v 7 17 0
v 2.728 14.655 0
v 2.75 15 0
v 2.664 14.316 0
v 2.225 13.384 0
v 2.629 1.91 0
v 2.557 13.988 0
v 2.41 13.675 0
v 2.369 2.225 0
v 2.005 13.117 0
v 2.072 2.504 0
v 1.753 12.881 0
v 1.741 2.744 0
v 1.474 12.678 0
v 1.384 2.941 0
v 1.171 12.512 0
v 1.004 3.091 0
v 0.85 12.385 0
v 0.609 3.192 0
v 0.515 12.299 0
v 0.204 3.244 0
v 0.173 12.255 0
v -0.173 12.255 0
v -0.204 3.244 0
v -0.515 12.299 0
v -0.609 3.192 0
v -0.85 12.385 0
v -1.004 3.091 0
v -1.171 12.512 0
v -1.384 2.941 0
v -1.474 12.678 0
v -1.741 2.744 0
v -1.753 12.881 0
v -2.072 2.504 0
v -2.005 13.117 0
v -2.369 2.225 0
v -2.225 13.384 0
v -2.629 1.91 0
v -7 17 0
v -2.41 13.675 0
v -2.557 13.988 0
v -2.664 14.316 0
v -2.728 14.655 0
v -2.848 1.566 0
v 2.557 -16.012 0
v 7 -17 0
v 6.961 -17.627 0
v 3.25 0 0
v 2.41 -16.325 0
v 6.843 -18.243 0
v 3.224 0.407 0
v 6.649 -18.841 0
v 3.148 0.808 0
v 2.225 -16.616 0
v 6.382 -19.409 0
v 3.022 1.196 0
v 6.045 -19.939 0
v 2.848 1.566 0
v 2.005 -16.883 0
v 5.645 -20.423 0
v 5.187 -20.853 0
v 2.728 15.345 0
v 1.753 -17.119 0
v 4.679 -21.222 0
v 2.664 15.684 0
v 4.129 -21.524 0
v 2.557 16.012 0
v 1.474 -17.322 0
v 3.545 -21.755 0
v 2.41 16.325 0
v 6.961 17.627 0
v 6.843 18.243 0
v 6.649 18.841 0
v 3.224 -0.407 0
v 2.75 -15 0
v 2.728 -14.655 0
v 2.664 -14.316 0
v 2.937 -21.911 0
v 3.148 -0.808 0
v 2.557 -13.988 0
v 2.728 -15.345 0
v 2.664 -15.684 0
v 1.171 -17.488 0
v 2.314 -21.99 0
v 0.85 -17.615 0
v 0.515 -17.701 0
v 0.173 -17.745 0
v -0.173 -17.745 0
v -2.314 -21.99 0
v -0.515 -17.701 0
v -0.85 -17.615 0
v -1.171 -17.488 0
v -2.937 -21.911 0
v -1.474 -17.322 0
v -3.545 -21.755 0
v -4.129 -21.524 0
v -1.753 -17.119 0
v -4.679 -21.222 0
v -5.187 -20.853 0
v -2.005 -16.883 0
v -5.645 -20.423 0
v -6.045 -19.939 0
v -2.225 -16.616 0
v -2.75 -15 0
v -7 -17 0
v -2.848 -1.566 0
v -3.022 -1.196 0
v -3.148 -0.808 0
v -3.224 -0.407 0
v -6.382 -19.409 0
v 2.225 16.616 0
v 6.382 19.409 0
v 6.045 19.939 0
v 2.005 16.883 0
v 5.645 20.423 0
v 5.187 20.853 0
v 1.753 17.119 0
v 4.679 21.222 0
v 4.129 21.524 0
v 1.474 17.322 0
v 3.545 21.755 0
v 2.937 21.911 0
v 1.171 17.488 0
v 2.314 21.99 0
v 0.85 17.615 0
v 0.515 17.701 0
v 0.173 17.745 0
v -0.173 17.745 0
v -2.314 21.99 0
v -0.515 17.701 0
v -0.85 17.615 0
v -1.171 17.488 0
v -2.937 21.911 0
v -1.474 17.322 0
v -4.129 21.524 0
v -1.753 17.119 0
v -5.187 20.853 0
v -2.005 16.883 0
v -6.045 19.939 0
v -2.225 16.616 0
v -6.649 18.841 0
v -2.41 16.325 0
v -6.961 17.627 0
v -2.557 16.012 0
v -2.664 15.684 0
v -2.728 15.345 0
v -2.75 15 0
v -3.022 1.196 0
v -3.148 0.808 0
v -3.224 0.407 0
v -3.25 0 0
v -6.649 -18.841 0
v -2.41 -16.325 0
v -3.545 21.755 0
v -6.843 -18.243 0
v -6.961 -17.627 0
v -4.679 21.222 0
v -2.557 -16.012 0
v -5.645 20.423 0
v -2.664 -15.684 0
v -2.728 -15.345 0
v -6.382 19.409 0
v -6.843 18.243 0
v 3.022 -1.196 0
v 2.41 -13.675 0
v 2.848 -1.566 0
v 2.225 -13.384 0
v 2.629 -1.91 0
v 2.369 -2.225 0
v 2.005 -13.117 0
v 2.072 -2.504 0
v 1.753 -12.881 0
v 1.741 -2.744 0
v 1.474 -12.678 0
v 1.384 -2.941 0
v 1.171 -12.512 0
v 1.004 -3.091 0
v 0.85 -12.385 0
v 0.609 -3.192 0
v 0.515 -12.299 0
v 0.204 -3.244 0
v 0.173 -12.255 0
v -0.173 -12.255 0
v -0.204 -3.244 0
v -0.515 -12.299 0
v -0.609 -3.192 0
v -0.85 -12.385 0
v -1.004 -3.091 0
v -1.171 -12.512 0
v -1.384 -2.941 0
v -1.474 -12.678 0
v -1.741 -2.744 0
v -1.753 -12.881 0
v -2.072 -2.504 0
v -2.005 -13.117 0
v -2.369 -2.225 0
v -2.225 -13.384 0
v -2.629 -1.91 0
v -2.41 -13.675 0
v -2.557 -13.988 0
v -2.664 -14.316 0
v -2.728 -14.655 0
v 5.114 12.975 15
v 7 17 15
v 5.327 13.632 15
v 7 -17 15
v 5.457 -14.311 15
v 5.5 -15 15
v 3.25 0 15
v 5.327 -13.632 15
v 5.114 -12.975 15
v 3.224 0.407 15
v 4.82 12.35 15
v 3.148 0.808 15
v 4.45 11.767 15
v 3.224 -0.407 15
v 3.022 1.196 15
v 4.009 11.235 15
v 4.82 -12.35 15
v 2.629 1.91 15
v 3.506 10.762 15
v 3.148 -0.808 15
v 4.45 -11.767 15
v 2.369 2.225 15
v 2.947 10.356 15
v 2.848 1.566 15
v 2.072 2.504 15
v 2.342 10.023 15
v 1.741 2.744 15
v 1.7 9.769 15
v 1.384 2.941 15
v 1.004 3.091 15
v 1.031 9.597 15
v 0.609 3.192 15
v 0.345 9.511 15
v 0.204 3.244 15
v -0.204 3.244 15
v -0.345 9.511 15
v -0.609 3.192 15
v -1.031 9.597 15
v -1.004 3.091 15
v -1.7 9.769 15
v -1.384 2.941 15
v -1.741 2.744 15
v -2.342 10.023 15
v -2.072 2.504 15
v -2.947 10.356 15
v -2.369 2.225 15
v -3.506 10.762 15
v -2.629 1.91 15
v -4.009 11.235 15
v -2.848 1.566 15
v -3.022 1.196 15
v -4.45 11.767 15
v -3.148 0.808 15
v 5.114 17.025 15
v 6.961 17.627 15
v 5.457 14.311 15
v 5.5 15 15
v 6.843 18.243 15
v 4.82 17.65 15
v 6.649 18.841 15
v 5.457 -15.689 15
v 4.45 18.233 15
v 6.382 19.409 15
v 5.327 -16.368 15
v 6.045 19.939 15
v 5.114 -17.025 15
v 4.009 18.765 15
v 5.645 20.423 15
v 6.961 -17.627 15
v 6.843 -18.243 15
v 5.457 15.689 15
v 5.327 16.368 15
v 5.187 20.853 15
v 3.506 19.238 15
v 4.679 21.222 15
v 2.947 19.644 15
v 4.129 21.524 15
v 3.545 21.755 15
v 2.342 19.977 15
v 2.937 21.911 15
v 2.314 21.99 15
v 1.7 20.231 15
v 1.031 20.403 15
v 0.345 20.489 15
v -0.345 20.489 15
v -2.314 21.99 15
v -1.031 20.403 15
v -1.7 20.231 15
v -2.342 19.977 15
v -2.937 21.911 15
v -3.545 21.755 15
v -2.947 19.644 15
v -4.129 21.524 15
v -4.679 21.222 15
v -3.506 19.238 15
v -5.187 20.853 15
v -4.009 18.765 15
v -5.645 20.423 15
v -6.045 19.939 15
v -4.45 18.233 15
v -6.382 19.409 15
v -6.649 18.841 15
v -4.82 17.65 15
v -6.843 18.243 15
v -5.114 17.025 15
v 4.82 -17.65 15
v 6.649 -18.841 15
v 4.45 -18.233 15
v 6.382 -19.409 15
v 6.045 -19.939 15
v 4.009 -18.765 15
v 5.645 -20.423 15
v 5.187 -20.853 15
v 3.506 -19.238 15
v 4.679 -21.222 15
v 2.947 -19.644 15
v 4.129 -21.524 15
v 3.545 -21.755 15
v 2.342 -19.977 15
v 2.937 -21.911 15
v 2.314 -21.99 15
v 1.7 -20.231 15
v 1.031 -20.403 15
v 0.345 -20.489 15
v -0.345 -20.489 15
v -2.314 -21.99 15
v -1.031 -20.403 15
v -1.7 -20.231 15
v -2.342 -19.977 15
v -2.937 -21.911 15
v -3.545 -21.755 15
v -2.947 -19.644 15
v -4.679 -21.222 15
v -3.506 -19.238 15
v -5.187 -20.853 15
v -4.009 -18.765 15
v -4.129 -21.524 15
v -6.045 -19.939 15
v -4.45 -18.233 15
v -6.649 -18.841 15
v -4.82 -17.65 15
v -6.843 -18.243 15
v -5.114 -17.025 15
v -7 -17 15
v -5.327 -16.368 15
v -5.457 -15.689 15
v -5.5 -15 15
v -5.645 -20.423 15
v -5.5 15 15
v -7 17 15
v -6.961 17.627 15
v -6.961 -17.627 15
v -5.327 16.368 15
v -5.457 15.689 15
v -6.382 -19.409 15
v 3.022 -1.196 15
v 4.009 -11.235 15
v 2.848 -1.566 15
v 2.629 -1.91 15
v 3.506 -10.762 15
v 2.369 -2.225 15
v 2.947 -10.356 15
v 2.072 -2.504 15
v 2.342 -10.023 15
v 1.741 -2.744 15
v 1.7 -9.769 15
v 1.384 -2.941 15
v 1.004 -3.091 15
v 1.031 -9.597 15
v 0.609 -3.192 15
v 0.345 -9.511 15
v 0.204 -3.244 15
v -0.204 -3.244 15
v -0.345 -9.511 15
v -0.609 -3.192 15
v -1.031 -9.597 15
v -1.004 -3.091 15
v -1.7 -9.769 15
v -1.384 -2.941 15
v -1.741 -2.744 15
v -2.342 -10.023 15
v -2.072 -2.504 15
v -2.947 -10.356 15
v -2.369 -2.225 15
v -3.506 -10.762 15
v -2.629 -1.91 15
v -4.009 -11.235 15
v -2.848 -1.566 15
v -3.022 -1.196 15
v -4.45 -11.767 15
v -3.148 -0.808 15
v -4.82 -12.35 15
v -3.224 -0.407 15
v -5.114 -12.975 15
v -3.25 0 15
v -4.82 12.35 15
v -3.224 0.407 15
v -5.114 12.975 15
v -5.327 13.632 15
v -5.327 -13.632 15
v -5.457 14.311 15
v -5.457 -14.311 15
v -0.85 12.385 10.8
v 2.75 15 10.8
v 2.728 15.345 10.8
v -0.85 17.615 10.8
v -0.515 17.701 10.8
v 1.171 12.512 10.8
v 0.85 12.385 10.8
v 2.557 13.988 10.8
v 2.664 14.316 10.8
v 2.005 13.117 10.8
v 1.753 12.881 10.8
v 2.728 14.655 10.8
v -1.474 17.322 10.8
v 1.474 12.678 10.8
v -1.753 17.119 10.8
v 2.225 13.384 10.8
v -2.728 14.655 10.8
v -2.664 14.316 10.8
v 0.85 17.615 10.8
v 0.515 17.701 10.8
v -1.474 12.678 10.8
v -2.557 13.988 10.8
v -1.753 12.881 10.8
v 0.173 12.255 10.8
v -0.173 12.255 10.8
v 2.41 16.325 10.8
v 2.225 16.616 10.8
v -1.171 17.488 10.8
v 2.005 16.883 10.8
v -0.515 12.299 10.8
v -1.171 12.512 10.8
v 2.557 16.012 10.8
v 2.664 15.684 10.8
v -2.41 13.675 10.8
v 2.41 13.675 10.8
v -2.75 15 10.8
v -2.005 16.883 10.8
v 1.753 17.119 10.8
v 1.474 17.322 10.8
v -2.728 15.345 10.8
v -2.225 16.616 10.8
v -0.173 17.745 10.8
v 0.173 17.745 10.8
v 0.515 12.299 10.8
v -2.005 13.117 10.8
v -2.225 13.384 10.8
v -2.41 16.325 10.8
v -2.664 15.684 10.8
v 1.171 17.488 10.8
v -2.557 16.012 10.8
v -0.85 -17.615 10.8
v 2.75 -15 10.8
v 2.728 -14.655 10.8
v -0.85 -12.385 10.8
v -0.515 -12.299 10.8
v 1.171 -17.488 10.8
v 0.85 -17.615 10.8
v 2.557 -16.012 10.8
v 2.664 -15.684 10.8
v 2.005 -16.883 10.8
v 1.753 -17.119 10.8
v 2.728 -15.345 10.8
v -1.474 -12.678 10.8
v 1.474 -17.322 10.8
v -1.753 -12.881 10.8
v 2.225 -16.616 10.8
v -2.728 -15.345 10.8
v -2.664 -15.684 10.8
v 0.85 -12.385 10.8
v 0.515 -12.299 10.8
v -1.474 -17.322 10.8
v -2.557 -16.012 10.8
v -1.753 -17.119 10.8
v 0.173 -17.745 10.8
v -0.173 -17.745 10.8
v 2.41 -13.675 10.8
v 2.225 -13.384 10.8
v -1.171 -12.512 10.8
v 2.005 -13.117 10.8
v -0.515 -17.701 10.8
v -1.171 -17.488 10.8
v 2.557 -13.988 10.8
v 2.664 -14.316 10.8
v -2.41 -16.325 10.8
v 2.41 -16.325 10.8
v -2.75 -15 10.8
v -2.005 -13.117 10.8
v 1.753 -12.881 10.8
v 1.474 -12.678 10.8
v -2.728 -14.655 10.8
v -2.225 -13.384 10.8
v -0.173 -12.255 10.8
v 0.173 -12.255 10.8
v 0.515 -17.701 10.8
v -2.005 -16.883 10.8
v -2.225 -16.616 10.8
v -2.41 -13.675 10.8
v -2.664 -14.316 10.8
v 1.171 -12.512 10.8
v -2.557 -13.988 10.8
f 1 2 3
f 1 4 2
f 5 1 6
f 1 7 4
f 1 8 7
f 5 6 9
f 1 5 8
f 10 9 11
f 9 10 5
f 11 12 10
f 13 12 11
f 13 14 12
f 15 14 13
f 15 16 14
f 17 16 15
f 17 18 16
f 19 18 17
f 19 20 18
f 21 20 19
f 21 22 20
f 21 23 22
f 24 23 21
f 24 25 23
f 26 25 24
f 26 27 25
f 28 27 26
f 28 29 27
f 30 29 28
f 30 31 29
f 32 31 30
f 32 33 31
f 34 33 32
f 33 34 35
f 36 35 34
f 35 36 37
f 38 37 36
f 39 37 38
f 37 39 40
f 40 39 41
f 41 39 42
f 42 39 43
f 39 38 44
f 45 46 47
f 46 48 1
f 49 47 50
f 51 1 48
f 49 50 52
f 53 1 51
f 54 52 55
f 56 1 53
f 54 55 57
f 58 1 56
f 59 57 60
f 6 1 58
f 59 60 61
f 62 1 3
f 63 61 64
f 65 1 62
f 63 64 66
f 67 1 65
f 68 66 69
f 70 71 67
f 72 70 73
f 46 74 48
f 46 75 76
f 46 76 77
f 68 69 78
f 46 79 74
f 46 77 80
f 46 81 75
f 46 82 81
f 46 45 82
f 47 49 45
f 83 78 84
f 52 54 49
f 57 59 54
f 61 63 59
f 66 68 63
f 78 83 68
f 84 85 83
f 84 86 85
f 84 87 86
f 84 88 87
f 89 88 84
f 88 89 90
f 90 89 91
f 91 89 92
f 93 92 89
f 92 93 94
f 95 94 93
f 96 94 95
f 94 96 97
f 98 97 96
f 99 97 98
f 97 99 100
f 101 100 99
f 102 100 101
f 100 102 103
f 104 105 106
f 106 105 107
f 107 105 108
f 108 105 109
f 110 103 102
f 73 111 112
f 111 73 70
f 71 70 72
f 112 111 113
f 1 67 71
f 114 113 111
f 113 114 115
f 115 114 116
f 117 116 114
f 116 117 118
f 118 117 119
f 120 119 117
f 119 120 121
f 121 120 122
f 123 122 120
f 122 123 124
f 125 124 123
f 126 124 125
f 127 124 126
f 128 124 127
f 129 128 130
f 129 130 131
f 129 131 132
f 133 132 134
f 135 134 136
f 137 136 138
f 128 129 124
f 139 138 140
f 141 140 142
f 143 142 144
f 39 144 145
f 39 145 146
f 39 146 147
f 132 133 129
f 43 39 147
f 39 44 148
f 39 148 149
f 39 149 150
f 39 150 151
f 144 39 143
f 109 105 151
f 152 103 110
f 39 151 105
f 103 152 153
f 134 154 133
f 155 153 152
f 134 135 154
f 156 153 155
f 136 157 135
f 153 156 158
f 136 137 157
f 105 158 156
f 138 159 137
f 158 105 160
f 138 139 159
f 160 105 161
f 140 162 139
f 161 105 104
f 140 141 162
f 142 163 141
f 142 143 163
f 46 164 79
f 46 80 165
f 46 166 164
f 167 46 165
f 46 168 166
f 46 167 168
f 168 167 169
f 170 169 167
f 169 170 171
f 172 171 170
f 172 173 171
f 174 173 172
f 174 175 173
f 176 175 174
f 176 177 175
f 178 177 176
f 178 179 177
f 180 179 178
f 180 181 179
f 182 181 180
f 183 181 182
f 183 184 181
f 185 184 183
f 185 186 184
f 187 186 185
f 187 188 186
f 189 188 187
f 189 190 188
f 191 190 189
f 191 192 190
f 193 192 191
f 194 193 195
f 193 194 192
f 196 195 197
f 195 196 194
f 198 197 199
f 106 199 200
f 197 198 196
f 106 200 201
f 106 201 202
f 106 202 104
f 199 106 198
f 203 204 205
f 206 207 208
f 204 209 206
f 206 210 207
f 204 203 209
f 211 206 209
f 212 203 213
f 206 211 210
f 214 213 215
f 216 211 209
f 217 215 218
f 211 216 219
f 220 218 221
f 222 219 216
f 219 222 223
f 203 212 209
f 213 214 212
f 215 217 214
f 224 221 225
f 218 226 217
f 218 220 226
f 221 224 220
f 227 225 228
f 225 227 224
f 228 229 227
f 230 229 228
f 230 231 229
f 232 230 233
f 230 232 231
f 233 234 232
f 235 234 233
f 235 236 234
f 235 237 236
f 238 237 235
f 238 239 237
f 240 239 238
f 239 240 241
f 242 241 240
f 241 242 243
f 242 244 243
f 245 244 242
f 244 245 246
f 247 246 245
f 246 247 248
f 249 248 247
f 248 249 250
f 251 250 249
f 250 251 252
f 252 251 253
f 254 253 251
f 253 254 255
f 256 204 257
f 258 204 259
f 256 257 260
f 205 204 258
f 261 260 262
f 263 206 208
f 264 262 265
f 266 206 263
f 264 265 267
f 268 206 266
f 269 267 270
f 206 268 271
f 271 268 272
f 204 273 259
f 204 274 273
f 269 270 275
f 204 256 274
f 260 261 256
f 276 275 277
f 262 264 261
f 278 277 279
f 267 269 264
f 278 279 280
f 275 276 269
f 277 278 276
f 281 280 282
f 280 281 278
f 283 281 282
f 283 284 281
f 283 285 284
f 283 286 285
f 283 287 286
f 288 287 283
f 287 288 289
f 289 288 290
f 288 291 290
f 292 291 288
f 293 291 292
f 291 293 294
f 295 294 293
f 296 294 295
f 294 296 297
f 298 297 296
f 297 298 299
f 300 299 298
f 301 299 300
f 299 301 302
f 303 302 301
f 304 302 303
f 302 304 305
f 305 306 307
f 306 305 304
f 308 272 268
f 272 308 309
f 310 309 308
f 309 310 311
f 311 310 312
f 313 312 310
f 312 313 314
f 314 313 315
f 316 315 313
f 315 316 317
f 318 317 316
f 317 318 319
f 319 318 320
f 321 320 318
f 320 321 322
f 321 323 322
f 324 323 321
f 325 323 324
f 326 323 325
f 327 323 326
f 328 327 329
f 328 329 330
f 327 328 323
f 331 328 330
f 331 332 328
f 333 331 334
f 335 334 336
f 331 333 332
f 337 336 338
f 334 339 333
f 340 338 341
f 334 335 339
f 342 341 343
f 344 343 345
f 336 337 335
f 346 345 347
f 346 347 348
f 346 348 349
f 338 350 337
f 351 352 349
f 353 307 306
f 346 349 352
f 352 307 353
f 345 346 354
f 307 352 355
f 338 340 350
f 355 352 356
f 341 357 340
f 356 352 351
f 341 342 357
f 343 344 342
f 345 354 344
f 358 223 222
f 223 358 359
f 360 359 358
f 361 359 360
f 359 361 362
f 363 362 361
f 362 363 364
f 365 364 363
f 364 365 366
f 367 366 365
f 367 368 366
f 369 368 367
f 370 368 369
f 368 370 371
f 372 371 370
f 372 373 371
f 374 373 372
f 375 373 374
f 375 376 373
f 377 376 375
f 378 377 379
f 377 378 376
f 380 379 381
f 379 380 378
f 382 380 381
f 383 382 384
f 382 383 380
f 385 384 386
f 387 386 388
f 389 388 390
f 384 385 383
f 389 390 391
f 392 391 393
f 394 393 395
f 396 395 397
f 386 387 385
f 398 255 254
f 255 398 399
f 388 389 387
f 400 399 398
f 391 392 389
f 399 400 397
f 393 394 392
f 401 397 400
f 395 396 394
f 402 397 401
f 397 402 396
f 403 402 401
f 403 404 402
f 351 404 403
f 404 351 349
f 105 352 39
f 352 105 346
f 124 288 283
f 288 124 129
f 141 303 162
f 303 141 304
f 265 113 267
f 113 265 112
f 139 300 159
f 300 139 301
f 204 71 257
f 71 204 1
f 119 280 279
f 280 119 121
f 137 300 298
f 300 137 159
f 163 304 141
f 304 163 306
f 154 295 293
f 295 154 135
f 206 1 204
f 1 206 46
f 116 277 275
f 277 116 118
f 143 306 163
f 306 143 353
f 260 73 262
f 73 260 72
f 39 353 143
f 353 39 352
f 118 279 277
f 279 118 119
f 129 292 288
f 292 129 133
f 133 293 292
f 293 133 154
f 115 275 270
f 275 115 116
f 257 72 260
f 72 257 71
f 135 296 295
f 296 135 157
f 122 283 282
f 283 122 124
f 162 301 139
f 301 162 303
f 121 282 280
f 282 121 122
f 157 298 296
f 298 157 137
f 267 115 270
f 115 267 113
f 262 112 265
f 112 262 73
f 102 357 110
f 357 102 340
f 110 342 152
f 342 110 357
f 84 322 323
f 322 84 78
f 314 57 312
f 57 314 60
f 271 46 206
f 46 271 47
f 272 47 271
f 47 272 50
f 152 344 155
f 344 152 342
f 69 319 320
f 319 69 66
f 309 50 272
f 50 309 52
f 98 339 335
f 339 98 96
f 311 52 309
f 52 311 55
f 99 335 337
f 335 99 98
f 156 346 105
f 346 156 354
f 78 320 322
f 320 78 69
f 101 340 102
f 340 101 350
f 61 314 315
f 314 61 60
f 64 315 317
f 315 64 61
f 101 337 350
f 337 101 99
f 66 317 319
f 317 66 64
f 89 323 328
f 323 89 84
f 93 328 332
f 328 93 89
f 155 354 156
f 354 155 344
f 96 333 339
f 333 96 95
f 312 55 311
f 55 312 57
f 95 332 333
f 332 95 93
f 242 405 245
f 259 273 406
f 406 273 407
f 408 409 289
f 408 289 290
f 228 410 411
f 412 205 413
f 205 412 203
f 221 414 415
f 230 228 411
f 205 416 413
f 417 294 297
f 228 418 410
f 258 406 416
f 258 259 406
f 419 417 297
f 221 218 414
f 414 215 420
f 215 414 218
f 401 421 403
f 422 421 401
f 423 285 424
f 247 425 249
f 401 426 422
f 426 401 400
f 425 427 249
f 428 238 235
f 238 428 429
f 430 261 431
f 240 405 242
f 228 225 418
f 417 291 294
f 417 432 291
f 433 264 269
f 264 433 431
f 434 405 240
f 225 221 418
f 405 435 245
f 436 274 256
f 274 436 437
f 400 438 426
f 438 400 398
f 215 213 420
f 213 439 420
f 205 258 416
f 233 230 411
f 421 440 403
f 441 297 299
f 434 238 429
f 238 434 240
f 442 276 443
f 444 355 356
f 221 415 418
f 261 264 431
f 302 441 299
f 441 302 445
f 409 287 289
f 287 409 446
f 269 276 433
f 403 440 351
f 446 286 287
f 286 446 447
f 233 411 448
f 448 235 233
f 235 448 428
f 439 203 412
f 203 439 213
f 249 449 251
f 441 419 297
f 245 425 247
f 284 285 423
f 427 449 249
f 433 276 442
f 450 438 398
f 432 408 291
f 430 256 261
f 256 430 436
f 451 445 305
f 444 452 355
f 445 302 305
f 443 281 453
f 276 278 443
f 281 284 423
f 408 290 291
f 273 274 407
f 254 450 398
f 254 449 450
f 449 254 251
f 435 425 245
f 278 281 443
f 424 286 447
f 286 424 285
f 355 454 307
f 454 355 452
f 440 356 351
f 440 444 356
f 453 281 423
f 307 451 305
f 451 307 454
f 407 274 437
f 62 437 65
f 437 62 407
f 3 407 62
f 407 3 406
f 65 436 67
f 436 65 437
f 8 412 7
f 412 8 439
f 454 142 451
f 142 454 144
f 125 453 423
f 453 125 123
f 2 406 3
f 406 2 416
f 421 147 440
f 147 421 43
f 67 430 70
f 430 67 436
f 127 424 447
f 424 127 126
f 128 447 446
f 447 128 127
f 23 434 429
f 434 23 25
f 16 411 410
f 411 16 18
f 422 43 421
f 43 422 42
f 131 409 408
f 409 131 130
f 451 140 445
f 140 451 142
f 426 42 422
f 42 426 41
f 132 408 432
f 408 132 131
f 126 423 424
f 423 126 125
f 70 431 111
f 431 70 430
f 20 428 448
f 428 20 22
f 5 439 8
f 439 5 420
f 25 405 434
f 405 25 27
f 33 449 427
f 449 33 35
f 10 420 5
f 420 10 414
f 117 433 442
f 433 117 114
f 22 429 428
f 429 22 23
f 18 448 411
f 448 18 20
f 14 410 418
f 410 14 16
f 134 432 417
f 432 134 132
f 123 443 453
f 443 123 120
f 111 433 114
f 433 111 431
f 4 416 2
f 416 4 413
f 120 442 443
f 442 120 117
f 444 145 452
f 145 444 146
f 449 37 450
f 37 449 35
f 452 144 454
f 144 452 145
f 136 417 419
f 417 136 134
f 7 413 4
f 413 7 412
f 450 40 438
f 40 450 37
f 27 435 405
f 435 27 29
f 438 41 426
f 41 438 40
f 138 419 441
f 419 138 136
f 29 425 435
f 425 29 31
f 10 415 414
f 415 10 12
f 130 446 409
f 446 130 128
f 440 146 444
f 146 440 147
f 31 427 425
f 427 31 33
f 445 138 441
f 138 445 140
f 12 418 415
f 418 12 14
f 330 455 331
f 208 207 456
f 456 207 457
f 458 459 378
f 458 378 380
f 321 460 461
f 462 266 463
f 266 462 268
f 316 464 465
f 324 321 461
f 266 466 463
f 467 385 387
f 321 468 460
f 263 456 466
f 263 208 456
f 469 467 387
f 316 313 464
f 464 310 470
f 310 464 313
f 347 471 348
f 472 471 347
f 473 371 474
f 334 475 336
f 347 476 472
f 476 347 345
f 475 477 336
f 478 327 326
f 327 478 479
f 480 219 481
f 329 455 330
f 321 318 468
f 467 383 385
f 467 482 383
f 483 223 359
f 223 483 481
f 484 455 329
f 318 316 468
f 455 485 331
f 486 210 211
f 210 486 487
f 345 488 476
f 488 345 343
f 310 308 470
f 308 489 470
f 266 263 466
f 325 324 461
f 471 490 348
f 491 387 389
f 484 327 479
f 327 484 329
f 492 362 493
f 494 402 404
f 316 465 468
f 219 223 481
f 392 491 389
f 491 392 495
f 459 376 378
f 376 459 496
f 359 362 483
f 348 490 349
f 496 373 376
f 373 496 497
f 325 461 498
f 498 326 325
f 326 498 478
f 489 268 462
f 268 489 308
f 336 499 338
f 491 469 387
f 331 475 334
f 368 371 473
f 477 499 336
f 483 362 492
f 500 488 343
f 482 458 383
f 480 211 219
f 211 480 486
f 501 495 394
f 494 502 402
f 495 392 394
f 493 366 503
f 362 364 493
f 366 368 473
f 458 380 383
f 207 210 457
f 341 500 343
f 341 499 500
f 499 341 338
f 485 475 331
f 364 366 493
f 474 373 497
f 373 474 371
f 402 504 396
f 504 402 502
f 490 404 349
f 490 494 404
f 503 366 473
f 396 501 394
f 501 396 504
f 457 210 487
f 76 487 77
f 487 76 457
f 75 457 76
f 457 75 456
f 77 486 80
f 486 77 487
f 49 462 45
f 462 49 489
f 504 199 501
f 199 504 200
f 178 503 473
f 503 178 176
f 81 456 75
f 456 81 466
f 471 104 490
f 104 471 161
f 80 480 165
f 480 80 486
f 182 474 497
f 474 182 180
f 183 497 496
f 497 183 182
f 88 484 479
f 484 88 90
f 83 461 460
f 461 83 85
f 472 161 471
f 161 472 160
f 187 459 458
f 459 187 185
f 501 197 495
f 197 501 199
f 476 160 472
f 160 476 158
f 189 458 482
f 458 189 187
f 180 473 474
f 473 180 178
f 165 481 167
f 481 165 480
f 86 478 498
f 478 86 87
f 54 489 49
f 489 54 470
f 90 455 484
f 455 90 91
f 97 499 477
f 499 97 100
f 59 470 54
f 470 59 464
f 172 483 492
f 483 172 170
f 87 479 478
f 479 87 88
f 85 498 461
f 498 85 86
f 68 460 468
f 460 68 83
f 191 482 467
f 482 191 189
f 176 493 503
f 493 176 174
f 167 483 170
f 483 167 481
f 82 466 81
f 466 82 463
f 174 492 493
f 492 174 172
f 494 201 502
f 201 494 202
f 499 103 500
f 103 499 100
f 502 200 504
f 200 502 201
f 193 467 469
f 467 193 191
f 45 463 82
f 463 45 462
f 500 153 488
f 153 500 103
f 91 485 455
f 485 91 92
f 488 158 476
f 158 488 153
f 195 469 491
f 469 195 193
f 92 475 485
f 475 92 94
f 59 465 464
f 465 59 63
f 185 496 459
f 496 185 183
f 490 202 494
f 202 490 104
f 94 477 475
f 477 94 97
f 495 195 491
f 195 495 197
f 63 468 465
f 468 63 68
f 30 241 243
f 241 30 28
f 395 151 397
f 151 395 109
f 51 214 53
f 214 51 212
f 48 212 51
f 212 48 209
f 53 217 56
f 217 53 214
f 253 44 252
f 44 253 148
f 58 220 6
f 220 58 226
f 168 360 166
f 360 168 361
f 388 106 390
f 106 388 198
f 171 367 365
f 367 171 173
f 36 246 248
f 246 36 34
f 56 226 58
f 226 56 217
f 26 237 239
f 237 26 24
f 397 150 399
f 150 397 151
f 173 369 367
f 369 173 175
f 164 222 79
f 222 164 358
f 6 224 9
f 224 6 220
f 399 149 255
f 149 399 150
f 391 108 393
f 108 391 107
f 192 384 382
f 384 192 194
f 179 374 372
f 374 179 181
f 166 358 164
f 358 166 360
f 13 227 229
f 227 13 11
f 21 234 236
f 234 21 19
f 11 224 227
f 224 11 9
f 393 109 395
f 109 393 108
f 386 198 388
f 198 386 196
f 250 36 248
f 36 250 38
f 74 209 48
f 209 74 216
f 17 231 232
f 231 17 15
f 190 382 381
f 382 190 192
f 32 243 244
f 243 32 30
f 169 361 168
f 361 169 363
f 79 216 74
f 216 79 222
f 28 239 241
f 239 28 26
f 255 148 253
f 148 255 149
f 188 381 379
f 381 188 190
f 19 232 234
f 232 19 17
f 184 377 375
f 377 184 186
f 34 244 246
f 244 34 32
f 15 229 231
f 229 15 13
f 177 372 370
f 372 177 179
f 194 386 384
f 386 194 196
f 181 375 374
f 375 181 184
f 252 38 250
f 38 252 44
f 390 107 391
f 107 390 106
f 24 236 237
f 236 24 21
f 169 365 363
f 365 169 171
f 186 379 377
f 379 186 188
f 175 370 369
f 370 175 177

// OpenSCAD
$fn = 50;


difference() {
	union() {
		cylinder(h = 15, r = 7.0000000000);
		translate(v = [0.0000000000, 7.5000000000, 0]) {
			hull() {
				translate(v = [-2.0000000000, 9.5000000000, 0]) {
					cylinder(h = 15, r = 5);
				}
				translate(v = [2.0000000000, 9.5000000000, 0]) {
					cylinder(h = 15, r = 5);
				}
				translate(v = [-2.0000000000, -9.5000000000, 0]) {
					cylinder(h = 15, r = 5);
				}
				translate(v = [2.0000000000, -9.5000000000, 0]) {
					cylinder(h = 15, r = 5);
				}
			}
		}
		translate(v = [0.0000000000, 7.5000000000, 0]) {
			hull() {
				translate(v = [-2.0000000000, 9.5000000000, 0]) {
					cylinder(h = 15, r = 5);
				}
				translate(v = [2.0000000000, 9.5000000000, 0]) {
					cylinder(h = 15, r = 5);
				}
				translate(v = [-2.0000000000, -9.5000000000, 0]) {
					cylinder(h = 15, r = 5);
				}
				translate(v = [2.0000000000, -9.5000000000, 0]) {
					cylinder(h = 15, r = 5);
				}
			}
		}
		translate(v = [0.0000000000, -7.5000000000, 0]) {
			hull() {
				translate(v = [-2.0000000000, 9.5000000000, 0]) {
					cylinder(h = 15, r = 5);
				}
				translate(v = [2.0000000000, 9.5000000000, 0]) {
					cylinder(h = 15, r = 5);
				}
				translate(v = [-2.0000000000, -9.5000000000, 0]) {
					cylinder(h = 15, r = 5);
				}
				translate(v = [2.0000000000, -9.5000000000, 0]) {
					cylinder(h = 15, r = 5);
				}
			}
		}
		translate(v = [0.0000000000, -7.5000000000, 0]) {
			hull() {
				translate(v = [-2.0000000000, 9.5000000000, 0]) {
					cylinder(h = 15, r = 5);
				}
				translate(v = [2.0000000000, 9.5000000000, 0]) {
					cylinder(h = 15, r = 5);
				}
				translate(v = [-2.0000000000, -9.5000000000, 0]) {
					cylinder(h = 15, r = 5);
				}
				translate(v = [2.0000000000, -9.5000000000, 0]) {
					cylinder(h = 15, r = 5);
				}
			}
		}
	}
	union() {
		translate(v = [0.0000000000, 15.0000000000, 15]) {
			rotate(a = [0, 0, 0]) {
				difference() {
					union() {
						#translate(v = [0, 0, -15.0000000000]) {
							cylinder(h = 15, r = 2.2500000000);
						}
						#translate(v = [0, 0, -4.2000000000]) {
							cylinder(h = 4.2000000000, r1 = 2.7500000000, r2 = 5.5000000000);
						}
						#translate(v = [0, 0, -15.0000000000]) {
							cylinder(h = 15, r = 2.7500000000);
						}
						#translate(v = [0, 0, -15.0000000000]) {
							cylinder(h = 15, r = 2.2500000000);
						}
					}
					union();
				}
			}
		}
		translate(v = [0.0000000000, 15.0000000000, 15]) {
			rotate(a = [0, 0, 0]) {
				difference() {
					union() {
						#translate(v = [0, 0, -15.0000000000]) {
							cylinder(h = 15, r = 2.2500000000);
						}
						#translate(v = [0, 0, -4.2000000000]) {
							cylinder(h = 4.2000000000, r1 = 2.7500000000, r2 = 5.5000000000);
						}
						#translate(v = [0, 0, -15.0000000000]) {
							cylinder(h = 15, r = 2.7500000000);
						}
						#translate(v = [0, 0, -15.0000000000]) {
							cylinder(h = 15, r = 2.2500000000);
						}
					}
					union();
				}
			}
		}
		translate(v = [0.0000000000, -15.0000000000, 15]) {
			rotate(a = [0, 0, 0]) {
				difference() {
					union() {
						#translate(v = [0, 0, -15.0000000000]) {
							cylinder(h = 15, r = 2.2500000000);
						}
						#translate(v = [0, 0, -4.2000000000]) {
							cylinder(h = 4.2000000000, r1 = 2.7500000000, r2 = 5.5000000000);
						}
						#translate(v = [0, 0, -15.0000000000]) {
							cylinder(h = 15, r = 2.7500000000);
						}
						#translate(v = [0, 0, -15.0000000000]) {
							cylinder(h = 15, r = 2.2500000000);
						}
					}
					union();
				}
			}
		}
		translate(v = [0.0000000000, -15.0000000000, 15]) {
			rotate(a = [0, 0, 0]) {
				difference() {
					union() {
						#translate(v = [0, 0, -15.0000000000]) {
							cylinder(h = 15, r = 2.2500000000);
						}
						#translate(v = [0, 0, -4.2000000000]) {
							cylinder(h = 4.2000000000, r1 = 2.7500000000, r2 = 5.5000000000);
						}
						#translate(v = [0, 0, -15.0000000000]) {
							cylinder(h = 15, r = 2.7500000000);
						}
						#translate(v = [0, 0, -15.0000000000]) {
							cylinder(h = 15, r = 2.2500000000);
						}
					}
					union();
				}
			}
		}
		translate(v = [0, 0, -100]) {
			cylinder(h = 200, r = 3.2500000000);
		}
		translate(v = [0, 0, -100]) {
			cylinder(h = 200, r = 1.8000000000);
		}
	}
}
